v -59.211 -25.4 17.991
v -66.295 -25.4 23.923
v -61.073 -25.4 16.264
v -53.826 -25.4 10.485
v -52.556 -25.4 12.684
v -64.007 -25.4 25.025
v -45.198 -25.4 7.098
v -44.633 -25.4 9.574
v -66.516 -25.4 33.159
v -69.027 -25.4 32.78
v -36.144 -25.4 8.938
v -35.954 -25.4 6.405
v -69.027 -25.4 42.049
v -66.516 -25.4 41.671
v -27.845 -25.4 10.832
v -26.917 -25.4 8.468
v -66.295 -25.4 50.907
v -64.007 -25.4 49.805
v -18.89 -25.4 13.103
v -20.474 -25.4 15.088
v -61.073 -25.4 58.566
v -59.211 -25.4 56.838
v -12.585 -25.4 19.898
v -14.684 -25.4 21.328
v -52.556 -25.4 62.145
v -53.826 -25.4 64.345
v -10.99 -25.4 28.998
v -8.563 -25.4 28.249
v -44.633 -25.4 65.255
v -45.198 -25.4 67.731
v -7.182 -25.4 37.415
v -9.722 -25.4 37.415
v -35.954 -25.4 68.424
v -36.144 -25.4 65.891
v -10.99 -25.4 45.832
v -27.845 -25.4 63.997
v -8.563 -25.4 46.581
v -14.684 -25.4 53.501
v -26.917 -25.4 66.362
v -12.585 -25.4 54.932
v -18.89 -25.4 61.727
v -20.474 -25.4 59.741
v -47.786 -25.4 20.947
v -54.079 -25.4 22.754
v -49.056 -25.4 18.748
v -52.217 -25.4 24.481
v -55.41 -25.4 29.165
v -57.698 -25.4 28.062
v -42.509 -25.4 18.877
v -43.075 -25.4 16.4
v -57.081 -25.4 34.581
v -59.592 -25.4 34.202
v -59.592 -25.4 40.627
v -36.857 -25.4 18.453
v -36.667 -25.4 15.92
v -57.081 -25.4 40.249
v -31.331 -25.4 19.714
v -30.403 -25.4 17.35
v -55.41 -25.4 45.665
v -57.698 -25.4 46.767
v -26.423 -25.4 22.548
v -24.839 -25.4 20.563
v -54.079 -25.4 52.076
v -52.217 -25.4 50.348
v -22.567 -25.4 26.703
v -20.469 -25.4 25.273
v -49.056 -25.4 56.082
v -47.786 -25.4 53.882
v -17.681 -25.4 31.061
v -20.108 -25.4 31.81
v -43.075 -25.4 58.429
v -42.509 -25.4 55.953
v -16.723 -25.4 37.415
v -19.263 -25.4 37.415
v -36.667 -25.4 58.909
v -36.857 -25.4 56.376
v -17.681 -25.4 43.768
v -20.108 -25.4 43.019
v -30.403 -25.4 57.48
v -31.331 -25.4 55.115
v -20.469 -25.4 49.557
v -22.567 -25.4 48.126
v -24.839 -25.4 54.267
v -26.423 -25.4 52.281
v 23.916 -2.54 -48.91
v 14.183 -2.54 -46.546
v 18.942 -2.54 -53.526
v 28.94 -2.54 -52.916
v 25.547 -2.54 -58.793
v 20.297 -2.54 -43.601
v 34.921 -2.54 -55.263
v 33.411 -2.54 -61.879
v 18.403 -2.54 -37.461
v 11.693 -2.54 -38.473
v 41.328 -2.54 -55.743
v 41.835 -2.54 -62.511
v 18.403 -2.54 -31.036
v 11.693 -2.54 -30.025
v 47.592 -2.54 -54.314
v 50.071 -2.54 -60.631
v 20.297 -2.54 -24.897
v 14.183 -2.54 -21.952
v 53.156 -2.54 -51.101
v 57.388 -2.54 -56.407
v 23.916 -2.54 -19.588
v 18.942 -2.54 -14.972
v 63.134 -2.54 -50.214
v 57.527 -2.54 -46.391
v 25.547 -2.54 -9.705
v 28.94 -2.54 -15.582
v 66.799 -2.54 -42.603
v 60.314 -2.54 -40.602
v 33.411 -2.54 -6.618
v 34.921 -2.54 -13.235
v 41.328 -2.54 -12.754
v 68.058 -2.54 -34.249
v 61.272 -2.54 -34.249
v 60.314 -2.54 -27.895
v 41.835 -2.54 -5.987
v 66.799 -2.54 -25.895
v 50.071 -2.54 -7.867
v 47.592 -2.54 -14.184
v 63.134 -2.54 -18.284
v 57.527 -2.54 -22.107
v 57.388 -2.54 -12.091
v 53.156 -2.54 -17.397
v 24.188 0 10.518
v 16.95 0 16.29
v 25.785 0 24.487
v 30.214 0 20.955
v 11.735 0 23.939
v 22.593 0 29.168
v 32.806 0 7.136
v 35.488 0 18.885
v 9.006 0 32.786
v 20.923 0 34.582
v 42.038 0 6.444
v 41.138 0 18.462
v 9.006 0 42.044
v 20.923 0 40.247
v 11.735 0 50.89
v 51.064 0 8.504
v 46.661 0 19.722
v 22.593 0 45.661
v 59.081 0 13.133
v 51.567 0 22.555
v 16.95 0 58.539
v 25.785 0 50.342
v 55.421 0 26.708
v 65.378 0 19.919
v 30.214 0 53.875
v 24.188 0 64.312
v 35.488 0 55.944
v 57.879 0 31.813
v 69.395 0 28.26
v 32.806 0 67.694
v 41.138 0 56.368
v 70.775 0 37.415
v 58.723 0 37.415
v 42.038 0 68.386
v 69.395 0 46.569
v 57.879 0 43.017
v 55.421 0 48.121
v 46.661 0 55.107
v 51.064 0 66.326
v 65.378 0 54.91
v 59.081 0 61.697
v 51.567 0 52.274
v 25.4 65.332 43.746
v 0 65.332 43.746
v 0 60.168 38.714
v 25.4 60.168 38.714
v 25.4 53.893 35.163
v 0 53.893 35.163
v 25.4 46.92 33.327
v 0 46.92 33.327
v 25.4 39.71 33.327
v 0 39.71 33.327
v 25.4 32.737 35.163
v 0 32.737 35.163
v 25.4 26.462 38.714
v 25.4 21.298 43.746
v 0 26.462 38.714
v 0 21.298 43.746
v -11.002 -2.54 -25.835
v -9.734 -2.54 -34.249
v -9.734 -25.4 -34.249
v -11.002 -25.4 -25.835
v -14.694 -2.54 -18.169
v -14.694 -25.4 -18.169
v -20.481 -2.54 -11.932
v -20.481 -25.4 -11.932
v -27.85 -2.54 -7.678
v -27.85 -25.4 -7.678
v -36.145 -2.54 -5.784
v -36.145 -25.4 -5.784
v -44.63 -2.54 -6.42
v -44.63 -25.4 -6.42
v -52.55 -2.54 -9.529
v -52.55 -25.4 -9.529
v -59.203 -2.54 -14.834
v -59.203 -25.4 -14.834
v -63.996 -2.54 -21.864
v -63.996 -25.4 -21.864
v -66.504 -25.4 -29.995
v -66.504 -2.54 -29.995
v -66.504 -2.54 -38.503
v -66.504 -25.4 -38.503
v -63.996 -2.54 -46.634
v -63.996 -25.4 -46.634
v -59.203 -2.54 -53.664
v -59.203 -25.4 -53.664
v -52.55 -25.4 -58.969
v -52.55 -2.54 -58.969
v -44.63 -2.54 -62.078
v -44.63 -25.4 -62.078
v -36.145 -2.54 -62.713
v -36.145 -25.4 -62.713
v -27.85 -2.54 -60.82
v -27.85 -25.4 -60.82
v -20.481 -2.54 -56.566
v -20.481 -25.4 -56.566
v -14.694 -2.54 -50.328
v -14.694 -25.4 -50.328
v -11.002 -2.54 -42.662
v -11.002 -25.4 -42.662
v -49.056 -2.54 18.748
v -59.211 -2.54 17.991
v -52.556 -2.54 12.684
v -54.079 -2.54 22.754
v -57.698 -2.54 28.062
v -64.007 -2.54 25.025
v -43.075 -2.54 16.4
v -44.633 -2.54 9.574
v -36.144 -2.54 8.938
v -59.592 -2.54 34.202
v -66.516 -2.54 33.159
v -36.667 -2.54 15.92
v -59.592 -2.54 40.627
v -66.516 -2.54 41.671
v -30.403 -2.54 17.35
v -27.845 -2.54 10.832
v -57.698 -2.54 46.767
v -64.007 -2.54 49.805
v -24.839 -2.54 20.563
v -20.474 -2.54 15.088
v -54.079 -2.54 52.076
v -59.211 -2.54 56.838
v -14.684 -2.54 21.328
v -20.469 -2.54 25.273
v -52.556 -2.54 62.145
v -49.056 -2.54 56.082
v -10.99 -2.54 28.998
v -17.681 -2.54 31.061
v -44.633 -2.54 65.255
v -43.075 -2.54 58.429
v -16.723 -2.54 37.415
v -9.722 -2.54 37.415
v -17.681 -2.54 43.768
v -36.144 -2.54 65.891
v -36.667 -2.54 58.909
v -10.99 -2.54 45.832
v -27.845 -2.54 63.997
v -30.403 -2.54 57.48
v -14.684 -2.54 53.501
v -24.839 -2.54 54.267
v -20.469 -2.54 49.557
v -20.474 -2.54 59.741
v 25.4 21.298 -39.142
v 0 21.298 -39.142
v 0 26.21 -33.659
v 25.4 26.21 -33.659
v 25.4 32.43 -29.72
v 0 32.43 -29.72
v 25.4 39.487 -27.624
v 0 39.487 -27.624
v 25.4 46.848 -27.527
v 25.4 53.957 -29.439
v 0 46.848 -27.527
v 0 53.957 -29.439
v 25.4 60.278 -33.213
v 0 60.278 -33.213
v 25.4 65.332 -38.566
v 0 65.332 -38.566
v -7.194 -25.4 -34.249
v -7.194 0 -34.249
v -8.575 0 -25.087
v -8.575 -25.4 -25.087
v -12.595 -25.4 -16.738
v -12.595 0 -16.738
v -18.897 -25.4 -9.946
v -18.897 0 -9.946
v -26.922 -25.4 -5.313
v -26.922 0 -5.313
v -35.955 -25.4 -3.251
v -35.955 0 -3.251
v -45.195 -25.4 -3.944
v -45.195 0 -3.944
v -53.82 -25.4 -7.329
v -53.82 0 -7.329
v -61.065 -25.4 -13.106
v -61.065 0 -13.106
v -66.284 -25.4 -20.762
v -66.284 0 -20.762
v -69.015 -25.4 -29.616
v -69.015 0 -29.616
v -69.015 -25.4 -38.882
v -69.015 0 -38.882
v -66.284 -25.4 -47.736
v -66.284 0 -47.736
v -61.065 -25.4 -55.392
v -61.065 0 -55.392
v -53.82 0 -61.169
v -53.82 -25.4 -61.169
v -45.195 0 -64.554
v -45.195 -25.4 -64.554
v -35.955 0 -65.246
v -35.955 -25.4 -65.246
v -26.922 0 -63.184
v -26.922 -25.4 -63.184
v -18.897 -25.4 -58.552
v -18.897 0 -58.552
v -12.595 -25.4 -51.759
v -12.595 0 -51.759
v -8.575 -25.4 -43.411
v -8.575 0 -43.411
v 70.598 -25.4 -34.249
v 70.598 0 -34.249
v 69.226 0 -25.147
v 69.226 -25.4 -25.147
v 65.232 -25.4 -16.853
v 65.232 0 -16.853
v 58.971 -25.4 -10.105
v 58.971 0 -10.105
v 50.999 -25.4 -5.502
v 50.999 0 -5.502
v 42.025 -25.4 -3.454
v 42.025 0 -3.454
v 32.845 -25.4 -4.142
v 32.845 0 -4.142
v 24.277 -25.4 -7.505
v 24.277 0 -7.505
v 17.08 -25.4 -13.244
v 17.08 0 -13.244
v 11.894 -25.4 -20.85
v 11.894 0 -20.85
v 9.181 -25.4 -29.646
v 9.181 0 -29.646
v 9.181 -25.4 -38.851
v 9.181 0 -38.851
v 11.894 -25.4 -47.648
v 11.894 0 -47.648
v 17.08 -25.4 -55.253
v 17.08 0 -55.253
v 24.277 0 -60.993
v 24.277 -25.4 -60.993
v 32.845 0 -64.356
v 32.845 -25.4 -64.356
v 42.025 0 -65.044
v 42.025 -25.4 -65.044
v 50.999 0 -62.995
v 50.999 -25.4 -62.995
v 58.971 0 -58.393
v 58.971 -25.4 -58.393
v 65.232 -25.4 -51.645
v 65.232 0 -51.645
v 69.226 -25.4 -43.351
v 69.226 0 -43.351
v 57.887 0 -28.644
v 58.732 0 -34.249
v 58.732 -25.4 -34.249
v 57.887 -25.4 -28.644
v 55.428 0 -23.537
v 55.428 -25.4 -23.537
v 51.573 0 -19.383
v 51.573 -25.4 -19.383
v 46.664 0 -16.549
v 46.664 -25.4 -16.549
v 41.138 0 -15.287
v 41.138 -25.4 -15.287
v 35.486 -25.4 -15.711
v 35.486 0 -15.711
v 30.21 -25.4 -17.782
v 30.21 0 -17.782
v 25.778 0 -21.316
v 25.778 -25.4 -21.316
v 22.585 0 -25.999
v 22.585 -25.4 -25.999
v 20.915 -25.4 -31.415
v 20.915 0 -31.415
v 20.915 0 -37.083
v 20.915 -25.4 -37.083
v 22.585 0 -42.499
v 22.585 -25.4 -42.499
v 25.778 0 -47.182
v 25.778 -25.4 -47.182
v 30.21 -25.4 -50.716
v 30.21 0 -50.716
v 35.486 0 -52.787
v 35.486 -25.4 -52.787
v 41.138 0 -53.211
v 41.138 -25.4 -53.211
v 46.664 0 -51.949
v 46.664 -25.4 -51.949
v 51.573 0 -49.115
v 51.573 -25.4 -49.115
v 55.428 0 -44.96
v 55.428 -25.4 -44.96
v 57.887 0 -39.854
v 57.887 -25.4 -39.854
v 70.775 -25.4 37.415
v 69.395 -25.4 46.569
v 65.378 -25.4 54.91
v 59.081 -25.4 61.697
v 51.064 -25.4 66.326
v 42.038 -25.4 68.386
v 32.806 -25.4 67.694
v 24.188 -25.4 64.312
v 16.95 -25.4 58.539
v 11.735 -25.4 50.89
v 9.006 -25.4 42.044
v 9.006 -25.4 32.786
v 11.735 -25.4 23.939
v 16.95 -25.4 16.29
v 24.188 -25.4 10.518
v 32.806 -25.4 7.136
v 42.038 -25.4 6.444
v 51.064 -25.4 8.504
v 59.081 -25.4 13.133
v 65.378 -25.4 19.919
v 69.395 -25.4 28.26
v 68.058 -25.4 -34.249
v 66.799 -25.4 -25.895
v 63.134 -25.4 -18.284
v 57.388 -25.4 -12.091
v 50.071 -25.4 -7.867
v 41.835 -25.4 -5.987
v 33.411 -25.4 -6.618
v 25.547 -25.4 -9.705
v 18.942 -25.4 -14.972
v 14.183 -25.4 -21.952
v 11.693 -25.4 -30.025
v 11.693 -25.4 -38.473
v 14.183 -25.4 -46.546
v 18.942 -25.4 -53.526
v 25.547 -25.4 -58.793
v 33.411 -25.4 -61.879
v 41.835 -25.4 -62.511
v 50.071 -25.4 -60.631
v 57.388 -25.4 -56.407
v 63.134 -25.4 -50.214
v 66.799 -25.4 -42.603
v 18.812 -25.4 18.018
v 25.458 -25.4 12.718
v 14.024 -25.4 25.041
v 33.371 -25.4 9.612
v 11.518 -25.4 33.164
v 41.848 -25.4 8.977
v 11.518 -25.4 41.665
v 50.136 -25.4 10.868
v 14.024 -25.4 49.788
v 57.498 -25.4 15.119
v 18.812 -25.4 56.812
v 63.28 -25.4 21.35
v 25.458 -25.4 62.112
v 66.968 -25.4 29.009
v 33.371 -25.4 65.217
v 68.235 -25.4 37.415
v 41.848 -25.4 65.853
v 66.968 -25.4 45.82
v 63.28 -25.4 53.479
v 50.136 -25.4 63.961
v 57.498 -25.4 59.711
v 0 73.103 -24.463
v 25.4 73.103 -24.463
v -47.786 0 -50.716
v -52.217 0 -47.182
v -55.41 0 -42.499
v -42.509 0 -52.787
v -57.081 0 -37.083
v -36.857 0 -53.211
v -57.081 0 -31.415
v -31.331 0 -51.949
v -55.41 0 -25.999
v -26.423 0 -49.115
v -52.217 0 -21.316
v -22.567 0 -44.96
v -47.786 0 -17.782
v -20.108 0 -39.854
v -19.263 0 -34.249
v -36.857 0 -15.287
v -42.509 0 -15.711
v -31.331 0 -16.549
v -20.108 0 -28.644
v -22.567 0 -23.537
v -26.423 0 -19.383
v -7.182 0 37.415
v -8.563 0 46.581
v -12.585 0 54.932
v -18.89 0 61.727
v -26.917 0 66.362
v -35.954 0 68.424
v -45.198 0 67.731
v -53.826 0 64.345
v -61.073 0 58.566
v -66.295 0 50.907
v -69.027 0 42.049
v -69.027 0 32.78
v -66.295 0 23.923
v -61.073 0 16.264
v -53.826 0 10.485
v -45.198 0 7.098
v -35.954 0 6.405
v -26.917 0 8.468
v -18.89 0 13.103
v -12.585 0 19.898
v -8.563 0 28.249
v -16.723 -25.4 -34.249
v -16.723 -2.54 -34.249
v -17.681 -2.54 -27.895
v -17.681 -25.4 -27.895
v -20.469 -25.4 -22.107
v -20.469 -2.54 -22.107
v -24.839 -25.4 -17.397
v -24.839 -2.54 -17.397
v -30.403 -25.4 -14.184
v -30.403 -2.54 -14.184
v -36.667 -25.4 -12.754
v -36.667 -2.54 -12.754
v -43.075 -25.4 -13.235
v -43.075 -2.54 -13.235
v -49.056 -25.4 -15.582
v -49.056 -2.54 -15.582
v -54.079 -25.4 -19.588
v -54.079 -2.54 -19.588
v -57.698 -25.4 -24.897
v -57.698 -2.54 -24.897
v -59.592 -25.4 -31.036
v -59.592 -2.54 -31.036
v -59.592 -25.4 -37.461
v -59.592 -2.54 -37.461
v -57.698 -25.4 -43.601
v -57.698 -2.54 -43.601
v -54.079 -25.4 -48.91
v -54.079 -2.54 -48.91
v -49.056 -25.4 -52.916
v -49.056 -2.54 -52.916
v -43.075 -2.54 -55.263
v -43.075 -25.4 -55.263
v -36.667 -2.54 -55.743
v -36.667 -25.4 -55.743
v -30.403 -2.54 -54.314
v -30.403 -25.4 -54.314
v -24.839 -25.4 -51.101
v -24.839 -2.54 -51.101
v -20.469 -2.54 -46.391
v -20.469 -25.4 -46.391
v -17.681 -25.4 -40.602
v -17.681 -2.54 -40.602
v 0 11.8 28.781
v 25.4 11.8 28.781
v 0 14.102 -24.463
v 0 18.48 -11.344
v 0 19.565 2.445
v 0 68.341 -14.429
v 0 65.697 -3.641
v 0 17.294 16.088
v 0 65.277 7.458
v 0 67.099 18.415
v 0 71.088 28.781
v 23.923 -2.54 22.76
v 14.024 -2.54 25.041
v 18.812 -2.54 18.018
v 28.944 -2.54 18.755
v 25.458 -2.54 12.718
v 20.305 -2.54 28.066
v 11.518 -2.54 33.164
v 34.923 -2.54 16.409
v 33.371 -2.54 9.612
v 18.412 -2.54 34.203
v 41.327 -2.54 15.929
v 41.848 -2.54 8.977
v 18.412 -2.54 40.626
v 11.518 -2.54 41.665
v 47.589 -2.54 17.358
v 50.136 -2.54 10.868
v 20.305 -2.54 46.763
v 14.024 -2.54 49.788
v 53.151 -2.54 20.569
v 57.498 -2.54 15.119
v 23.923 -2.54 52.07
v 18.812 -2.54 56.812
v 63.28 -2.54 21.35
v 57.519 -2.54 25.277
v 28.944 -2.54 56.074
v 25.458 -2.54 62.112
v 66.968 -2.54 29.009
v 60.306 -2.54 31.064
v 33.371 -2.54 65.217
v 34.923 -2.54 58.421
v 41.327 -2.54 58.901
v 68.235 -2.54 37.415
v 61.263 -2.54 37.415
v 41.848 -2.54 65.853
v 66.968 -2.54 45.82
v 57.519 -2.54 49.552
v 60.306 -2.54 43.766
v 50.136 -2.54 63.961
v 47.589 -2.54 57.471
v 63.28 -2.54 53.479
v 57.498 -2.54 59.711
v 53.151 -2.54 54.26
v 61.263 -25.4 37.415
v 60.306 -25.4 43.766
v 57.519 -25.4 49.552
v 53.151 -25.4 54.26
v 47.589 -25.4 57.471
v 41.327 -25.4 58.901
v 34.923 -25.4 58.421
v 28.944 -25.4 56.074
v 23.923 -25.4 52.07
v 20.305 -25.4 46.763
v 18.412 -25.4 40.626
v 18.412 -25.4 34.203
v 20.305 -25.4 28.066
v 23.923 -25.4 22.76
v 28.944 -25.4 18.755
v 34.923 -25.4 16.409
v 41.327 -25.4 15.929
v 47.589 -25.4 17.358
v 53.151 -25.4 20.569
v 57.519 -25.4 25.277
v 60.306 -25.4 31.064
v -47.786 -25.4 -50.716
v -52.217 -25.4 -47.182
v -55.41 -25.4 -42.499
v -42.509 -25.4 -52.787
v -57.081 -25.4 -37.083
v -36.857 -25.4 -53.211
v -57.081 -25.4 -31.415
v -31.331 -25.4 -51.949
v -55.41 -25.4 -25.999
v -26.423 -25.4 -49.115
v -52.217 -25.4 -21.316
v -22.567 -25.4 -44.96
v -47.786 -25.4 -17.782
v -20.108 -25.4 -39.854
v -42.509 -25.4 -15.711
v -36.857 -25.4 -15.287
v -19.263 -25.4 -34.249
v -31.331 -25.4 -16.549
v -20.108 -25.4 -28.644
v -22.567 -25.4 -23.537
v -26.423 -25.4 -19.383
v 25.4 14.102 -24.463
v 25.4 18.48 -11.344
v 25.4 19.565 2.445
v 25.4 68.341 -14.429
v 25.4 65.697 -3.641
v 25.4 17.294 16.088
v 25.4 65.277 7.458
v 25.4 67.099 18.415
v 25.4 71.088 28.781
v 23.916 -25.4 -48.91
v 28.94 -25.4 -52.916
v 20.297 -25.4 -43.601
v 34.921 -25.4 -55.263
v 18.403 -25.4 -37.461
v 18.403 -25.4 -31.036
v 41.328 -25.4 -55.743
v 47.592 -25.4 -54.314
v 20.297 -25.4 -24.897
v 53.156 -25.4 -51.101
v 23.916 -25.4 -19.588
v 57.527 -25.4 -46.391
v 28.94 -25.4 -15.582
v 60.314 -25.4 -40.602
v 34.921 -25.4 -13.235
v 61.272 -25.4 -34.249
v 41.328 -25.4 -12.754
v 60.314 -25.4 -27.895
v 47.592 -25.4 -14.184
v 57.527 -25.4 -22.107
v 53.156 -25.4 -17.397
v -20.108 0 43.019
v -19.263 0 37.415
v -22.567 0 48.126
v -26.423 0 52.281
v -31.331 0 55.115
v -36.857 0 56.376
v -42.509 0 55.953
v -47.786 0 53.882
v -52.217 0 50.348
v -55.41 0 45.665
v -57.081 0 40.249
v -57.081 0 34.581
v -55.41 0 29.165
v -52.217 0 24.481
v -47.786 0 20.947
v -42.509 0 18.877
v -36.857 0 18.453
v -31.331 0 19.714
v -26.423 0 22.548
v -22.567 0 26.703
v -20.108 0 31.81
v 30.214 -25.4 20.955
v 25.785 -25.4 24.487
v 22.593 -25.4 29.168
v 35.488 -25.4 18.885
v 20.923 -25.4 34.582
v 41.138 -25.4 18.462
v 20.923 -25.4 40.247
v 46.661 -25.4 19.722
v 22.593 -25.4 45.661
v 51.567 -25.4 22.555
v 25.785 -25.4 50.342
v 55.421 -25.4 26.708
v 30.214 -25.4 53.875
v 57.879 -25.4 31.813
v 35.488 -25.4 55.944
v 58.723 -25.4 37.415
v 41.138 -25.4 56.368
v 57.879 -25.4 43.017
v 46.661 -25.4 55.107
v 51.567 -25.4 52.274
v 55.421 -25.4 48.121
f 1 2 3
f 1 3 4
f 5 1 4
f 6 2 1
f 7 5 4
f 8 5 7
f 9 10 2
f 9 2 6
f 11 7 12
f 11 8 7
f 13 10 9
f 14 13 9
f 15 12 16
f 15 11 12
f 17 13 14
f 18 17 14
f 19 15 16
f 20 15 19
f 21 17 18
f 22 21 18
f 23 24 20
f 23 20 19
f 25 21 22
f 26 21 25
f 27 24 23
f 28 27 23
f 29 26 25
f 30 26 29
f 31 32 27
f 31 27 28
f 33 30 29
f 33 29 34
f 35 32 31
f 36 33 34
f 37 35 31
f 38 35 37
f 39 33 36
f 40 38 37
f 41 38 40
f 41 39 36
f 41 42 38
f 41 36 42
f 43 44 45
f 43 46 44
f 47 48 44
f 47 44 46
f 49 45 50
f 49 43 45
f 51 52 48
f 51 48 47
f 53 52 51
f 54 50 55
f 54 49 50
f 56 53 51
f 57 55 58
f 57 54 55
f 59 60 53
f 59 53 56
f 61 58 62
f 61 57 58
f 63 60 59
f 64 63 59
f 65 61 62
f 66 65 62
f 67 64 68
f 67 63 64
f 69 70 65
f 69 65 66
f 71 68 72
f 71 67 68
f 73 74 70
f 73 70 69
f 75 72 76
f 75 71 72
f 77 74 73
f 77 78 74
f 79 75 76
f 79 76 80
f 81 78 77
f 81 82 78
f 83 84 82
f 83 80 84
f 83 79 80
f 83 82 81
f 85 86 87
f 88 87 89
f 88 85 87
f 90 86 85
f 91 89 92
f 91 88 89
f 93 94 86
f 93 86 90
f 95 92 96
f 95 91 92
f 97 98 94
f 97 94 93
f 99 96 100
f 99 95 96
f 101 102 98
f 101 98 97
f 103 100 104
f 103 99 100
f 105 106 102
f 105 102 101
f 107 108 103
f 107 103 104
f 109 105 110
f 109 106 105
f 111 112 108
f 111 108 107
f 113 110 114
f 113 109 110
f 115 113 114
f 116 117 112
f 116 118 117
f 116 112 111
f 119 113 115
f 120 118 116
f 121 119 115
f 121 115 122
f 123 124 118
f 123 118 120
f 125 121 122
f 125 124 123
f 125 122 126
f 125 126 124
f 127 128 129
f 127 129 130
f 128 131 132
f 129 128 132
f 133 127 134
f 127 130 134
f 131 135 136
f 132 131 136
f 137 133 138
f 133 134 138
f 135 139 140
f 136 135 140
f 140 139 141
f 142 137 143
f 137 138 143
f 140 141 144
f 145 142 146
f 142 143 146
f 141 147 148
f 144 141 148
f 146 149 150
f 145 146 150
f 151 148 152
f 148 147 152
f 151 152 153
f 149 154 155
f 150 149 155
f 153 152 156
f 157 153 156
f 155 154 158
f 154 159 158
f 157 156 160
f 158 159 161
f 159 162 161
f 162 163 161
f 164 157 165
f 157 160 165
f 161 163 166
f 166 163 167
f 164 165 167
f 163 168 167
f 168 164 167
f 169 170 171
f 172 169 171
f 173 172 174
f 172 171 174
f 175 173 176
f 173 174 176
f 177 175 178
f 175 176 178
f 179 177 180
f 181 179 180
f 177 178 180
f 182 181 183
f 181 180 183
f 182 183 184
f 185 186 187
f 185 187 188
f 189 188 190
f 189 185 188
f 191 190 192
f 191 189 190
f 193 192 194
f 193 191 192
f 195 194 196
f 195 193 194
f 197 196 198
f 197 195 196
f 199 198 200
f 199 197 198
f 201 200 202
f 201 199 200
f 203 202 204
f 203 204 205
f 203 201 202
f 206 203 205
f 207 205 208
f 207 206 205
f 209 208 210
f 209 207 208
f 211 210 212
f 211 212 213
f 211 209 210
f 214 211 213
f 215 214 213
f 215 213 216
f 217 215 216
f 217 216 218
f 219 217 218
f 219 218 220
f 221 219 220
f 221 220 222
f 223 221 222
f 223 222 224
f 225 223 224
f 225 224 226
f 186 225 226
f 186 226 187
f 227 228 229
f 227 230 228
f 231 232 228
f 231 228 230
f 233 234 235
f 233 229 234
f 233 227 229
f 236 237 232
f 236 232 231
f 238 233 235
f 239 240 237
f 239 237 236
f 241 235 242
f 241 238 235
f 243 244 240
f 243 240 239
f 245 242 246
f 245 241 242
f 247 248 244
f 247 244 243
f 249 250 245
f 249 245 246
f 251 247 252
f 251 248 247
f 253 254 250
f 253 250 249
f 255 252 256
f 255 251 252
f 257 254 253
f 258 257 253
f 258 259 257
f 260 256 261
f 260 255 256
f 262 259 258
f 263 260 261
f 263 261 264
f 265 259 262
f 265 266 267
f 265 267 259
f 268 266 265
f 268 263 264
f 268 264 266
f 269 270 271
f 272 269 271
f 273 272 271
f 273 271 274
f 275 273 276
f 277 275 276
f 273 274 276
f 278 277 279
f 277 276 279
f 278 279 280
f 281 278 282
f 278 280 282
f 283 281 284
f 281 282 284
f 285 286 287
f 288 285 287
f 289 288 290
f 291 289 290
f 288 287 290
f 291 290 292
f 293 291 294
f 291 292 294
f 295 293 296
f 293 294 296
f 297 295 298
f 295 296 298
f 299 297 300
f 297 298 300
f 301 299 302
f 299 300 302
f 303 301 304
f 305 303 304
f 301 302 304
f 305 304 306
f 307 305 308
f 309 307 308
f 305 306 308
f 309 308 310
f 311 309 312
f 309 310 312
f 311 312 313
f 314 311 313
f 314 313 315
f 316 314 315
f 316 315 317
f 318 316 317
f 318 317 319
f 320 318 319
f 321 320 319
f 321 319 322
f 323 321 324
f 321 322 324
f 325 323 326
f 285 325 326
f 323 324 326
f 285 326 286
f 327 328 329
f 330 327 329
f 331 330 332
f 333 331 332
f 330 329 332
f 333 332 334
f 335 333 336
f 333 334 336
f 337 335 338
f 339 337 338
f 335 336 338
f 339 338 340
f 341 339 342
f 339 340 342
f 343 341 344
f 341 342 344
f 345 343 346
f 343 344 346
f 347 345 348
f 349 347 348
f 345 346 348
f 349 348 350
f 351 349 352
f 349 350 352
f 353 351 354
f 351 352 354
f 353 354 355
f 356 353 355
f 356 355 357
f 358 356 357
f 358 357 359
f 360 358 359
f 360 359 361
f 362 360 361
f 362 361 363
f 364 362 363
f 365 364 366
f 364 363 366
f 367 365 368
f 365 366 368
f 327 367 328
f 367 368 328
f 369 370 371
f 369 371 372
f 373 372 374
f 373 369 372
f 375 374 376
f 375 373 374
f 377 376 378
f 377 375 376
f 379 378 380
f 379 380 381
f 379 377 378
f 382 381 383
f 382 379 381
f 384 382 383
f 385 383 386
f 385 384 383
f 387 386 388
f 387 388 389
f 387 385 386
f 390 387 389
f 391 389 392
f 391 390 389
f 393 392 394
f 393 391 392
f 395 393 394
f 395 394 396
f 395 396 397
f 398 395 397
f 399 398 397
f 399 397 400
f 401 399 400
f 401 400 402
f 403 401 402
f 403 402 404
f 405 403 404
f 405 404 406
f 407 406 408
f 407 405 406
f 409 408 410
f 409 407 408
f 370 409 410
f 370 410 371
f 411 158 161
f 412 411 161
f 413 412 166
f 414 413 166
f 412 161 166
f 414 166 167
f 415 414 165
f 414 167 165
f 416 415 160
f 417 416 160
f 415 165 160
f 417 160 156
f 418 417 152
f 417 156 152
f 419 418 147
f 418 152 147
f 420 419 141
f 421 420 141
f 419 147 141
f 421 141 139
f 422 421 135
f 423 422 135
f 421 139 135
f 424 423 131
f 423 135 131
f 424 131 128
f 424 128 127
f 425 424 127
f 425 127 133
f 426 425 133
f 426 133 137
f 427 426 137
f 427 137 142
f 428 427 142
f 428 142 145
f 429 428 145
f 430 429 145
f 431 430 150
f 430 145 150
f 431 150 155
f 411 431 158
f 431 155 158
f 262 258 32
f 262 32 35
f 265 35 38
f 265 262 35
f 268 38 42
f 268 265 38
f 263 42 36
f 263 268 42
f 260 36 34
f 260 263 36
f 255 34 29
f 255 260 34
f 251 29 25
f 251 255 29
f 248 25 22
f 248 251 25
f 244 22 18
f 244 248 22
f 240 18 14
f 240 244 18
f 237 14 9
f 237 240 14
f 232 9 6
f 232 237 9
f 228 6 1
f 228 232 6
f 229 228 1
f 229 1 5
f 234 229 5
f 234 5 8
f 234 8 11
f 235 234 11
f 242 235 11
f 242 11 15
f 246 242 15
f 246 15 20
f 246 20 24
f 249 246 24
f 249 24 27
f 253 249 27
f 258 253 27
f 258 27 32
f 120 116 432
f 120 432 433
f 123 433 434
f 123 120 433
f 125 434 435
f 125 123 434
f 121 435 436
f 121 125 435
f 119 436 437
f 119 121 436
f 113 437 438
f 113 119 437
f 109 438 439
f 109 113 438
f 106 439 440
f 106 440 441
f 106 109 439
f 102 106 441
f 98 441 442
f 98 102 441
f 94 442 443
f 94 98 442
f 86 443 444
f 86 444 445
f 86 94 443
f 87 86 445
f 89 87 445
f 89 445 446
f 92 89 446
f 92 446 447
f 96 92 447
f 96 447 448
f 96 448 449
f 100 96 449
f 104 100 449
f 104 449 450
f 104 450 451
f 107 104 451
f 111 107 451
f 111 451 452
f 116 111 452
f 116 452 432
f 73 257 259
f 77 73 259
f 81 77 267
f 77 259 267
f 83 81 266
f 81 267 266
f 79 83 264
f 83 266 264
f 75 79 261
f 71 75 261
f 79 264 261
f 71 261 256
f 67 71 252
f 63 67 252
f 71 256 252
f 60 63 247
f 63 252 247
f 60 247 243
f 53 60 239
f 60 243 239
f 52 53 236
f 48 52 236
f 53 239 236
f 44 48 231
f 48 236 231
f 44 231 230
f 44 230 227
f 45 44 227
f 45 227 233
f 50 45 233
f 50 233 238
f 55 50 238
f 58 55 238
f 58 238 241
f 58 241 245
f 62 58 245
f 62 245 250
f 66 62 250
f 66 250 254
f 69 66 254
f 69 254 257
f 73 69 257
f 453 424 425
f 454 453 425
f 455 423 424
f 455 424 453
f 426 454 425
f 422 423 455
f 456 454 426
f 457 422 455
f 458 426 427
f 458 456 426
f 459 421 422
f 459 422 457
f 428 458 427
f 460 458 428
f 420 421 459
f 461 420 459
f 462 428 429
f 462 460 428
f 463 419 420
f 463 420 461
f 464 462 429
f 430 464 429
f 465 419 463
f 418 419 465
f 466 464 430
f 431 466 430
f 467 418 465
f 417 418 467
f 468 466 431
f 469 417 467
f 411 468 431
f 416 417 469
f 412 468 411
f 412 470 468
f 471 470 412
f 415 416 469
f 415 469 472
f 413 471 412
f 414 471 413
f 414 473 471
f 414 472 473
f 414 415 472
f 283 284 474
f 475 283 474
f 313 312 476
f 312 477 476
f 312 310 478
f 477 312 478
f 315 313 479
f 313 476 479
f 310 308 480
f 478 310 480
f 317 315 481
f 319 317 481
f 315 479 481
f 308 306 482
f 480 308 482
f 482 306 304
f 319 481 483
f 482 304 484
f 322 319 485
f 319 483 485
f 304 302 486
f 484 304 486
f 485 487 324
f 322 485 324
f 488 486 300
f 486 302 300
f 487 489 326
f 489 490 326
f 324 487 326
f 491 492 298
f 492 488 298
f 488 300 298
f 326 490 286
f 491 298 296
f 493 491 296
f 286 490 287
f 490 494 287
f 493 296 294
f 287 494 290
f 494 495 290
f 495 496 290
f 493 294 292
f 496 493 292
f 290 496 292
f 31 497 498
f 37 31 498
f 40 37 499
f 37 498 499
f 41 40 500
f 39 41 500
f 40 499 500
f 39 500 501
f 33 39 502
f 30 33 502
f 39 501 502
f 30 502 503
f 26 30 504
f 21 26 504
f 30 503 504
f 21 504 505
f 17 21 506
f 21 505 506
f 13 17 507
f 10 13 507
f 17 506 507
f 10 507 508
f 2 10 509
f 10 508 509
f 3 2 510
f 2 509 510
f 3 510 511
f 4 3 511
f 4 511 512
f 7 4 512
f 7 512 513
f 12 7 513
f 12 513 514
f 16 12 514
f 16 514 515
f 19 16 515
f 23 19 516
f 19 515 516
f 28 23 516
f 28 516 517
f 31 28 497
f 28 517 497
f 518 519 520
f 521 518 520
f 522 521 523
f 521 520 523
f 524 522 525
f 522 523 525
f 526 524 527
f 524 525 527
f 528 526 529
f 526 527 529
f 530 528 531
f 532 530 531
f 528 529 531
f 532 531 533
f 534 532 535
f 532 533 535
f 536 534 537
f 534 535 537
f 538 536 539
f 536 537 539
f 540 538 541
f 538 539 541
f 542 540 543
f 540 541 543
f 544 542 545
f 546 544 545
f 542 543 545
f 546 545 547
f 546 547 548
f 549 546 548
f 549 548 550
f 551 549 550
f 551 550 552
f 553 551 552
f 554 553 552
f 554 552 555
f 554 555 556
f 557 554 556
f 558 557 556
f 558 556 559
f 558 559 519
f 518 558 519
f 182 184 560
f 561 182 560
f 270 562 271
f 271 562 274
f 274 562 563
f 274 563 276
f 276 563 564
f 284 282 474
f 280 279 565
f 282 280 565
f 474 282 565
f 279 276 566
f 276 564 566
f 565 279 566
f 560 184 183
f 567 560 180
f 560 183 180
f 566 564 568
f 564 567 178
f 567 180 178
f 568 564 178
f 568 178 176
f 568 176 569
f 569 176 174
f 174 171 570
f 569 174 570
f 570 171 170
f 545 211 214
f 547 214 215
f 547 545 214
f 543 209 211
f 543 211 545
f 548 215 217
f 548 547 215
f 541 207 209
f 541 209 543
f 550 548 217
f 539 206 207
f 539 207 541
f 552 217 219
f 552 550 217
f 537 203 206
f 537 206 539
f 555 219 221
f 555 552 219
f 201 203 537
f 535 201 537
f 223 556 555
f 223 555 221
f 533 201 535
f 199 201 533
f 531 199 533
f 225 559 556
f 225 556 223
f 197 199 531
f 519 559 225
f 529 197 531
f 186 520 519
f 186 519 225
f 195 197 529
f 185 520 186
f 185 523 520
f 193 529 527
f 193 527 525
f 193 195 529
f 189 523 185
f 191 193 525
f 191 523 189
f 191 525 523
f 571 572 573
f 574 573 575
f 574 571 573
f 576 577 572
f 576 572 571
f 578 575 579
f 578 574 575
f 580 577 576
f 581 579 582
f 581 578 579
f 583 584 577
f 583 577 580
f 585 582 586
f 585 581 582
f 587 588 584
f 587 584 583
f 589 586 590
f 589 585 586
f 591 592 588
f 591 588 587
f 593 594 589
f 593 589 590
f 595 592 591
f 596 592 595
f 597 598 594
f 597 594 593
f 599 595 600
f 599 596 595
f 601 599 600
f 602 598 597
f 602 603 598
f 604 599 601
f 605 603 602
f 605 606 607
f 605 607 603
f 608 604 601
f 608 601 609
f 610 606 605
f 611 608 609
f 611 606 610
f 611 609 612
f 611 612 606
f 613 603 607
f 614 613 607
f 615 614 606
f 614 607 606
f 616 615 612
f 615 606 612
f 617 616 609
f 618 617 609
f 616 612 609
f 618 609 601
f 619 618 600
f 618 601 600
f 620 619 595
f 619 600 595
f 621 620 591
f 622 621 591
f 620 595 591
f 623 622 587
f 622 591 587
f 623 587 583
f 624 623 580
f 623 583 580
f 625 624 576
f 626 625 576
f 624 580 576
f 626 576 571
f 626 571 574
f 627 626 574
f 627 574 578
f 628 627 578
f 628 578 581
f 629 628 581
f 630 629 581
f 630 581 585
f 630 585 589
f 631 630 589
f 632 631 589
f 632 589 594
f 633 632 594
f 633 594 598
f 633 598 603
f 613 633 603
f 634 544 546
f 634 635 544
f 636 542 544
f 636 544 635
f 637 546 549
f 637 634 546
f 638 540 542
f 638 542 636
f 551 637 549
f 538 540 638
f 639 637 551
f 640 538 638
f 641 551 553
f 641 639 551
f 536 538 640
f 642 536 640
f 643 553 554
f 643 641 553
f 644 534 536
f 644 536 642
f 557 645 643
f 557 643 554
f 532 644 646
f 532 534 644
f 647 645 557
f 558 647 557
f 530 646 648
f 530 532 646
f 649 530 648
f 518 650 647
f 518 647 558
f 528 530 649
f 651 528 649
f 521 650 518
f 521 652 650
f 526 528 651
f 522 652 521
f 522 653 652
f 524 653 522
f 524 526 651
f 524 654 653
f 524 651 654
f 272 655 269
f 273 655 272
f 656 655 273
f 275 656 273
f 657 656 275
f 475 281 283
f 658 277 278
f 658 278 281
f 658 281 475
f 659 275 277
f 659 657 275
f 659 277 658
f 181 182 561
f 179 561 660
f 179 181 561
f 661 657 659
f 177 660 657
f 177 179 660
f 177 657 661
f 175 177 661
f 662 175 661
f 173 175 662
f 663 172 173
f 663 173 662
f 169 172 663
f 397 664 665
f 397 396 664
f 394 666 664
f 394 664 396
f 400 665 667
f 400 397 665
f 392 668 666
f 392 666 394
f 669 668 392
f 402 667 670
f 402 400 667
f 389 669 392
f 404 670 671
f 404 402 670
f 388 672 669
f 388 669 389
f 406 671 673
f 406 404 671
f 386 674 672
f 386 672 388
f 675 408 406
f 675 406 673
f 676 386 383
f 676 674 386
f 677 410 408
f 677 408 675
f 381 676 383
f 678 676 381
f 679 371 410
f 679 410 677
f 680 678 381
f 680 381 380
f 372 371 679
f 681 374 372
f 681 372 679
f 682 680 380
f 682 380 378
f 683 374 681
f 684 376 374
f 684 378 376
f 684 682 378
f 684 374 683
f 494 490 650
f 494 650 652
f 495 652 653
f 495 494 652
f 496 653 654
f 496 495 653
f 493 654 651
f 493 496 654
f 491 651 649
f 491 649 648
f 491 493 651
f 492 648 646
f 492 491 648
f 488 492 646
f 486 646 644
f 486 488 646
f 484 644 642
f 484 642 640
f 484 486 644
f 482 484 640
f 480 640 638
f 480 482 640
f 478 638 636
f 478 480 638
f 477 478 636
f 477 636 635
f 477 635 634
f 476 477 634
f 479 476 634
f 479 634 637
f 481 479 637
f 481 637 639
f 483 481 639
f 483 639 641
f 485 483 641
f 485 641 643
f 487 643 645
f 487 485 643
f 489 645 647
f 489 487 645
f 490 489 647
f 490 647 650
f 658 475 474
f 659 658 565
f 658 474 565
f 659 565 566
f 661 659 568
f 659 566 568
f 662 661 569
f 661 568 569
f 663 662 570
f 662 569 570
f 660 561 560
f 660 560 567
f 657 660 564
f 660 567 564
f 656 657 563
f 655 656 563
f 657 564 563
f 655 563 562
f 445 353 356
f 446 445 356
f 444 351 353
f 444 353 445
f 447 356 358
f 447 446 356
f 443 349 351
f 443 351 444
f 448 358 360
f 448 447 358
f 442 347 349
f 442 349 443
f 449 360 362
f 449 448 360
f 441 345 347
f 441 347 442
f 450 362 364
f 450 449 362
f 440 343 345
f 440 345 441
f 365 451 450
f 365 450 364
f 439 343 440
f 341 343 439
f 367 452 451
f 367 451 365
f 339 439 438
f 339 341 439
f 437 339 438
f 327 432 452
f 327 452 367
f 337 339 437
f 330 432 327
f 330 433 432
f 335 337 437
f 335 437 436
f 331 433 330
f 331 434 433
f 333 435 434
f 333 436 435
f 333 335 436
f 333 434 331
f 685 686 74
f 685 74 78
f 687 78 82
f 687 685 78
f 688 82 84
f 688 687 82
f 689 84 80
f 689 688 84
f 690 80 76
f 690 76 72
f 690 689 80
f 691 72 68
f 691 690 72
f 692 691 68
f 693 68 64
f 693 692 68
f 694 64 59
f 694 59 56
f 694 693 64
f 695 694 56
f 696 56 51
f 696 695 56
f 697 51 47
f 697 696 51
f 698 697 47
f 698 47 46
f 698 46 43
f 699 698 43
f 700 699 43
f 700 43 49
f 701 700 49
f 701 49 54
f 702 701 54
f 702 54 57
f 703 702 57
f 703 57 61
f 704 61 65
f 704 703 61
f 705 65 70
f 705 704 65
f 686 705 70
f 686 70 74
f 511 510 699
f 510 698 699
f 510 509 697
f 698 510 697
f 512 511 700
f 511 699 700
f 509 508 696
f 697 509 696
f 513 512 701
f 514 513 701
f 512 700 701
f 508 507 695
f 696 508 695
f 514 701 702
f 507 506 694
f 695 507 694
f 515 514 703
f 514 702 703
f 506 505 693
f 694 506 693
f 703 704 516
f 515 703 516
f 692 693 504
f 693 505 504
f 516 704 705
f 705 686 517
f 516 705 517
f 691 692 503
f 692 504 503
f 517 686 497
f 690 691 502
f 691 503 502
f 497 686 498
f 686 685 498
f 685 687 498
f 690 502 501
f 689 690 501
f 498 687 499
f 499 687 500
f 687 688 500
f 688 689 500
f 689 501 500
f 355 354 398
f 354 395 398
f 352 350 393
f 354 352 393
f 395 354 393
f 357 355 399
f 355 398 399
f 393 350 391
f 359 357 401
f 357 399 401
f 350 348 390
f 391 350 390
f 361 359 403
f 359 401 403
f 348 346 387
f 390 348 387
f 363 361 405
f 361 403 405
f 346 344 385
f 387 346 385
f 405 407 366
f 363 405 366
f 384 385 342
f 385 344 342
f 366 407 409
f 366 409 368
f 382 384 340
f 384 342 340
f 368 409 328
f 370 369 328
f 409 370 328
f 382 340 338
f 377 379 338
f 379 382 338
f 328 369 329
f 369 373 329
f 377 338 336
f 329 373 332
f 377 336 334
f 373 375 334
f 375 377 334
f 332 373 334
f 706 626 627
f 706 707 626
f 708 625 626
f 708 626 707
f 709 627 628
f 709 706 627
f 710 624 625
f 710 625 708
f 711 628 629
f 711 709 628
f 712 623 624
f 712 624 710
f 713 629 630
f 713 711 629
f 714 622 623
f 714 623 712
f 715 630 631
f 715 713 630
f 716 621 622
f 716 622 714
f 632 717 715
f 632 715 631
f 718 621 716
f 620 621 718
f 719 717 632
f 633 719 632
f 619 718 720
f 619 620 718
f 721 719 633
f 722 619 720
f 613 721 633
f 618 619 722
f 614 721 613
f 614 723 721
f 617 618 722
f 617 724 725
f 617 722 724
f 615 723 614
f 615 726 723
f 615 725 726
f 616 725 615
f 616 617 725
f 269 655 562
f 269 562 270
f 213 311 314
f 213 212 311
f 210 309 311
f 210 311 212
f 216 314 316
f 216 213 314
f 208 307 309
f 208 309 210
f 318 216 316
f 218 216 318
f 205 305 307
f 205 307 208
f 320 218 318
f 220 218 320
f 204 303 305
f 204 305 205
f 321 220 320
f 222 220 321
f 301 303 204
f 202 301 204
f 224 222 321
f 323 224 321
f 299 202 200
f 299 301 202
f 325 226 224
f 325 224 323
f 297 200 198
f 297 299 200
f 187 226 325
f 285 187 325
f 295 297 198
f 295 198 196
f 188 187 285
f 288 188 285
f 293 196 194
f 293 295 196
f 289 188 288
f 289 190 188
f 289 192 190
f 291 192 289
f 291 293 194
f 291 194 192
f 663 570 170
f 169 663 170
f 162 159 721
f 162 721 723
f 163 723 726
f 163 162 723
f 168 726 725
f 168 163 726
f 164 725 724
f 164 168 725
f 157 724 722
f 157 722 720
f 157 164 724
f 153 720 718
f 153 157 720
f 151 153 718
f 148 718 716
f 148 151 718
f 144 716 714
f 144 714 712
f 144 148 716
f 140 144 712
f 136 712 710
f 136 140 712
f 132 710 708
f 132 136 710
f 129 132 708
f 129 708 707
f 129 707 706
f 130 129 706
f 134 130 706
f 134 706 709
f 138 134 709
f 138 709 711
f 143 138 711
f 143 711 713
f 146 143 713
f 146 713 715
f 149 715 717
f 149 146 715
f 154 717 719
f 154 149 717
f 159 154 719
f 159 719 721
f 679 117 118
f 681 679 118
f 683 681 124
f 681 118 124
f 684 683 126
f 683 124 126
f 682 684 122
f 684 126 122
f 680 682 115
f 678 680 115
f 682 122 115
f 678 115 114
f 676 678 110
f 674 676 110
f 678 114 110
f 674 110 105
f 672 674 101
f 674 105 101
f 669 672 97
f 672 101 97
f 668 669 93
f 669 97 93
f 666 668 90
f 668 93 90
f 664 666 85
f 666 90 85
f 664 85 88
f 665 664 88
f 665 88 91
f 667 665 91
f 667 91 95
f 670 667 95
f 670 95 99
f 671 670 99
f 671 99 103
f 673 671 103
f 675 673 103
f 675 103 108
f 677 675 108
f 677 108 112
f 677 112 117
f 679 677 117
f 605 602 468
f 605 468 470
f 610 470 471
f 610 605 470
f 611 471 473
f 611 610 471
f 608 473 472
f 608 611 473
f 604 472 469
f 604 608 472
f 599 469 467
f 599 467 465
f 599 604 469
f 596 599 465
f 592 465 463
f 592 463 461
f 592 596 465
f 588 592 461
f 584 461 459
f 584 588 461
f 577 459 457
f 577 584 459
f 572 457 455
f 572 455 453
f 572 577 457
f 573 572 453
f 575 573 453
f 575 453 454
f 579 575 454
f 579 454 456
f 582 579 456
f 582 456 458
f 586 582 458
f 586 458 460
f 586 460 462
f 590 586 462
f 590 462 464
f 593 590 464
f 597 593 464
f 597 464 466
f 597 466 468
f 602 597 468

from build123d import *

# Parameters (mm, degrees)
F0_R     = 31.0963465333
F0_R_2   = 19.0147929062
F1_DEPTH = 25.4
F0_R_3   = 31.0576997313
F0_R_4   = 19.0060845025
F0_R_5   = 30.8811703894
F0_R_6   = 19.0147950206
F0_R_7   = 31.0843529762
F0_R_8   = 19.0147914683
F2_T     = -2.54
F2_2_T   = -2.54
F2_3_T   = -2.54
F2_4_T   = -2.54
F4_DEPTH = 25.4


with BuildPart() as f1:
    # F0 (on Front) → F1 (new body)
    with BuildSketch(Plane.XZ):
        with Locations((-38.2781662047, 37.4147482216)):
            Circle(F0_R)
        with Locations((-38.2781662047, 37.4147482216)):
            Circle(F0_R_2, mode=Mode.SUBTRACT)
    extrude(amount=F1_DEPTH)

    # F2
    f2_openings = [f1.faces().sort_by_distance(p)[0] for p in [
        (-68.494975, -25.4, 37.414748),
    ]]
    offset(amount=F2_T, openings=f2_openings)


with BuildPart() as f1b:
    # F0 (on Front) → F1, piece 2 (new body)
    with BuildSketch(Plane.XZ):
        with Locations((39.7171974182, 37.4147482216)):
            Circle(F0_R_3)
        with Locations((39.7171974182, 37.4147482216)):
            Circle(F0_R_4, mode=Mode.SUBTRACT)
    extrude(amount=F1_DEPTH)

    # F2#2
    f2_2_openings = [f1b.faces().sort_by_distance(p)[0] for p in [
        (9.537942, -25.4, 37.414748),
    ]]
    offset(amount=F2_2_T, openings=f2_2_openings)


with BuildPart() as f1c:
    # F0 (on Front) → F1, piece 3 (new body)
    with BuildSketch(Plane.XZ):
        with Locations((39.7171974182, -34.2488847673)):
            Circle(F0_R_5)
        with Locations((39.7171974182, -34.2488847673)):
            Circle(F0_R_6, mode=Mode.SUBTRACT)
    extrude(amount=F1_DEPTH)

    # F2#3
    f2_3_openings = [f1c.faces().sort_by_distance(p)[0] for p in [
        (9.709478, -25.4, -34.248885),
    ]]
    offset(amount=F2_3_T, openings=f2_3_openings)


with BuildPart() as f1d:
    # F0 (on Front) → F1, piece 4 (new body)
    with BuildSketch(Plane.XZ):
        with Locations((-38.2781662047, -34.2488847673)):
            Circle(F0_R_7)
        with Locations((-38.2781662047, -34.2488847673)):
            Circle(F0_R_8, mode=Mode.SUBTRACT)
    extrude(amount=F1_DEPTH)

    # F2#4
    f2_4_openings = [f1d.faces().sort_by_distance(p)[0] for p in [
        (-68.483321, -25.4, -34.248885),
    ]]
    offset(amount=F2_4_T, openings=f2_4_openings)


with BuildPart() as f4:
    # F3 (on Right) → F4 (new body)
    with BuildSketch(Plane.YZ):
        with BuildLine():
            ThreePointArc((65.3319060802, 43.7464751303), (43.3147661388, 33.0943432266), (21.2976261973, 43.7464751303))
            Line((21.2976261973, 43.7464751303), (11.800034903, 28.7805777043))
            ThreePointArc((11.800034903, 28.7805777043), (19.5648254291, 2.4445360619), (14.1024803743, -24.4634896517))
            Line((14.1024803743, -24.4634896517), (21.2976261973, -39.1415841877))
            ThreePointArc((21.2976261973, -39.1415841877), (43.1640158341, -27.3214138959), (65.3319060802, -38.5659709573))
            Line((65.3319060802, -38.5659709573), (73.1026604772, -24.4634896517))
            ThreePointArc((73.1026604772, -24.4634896517), (65.2055359173, 1.8978491008), (71.0880234838, 28.7805777043))
            Line((71.0880234838, 28.7805777043), (65.3319060802, 43.7464751303))
        make_face()
    extrude(amount=F4_DEPTH)


solid = Compound([f1.part, f1b.part, f1c.part, f1d.part, f4.part])
